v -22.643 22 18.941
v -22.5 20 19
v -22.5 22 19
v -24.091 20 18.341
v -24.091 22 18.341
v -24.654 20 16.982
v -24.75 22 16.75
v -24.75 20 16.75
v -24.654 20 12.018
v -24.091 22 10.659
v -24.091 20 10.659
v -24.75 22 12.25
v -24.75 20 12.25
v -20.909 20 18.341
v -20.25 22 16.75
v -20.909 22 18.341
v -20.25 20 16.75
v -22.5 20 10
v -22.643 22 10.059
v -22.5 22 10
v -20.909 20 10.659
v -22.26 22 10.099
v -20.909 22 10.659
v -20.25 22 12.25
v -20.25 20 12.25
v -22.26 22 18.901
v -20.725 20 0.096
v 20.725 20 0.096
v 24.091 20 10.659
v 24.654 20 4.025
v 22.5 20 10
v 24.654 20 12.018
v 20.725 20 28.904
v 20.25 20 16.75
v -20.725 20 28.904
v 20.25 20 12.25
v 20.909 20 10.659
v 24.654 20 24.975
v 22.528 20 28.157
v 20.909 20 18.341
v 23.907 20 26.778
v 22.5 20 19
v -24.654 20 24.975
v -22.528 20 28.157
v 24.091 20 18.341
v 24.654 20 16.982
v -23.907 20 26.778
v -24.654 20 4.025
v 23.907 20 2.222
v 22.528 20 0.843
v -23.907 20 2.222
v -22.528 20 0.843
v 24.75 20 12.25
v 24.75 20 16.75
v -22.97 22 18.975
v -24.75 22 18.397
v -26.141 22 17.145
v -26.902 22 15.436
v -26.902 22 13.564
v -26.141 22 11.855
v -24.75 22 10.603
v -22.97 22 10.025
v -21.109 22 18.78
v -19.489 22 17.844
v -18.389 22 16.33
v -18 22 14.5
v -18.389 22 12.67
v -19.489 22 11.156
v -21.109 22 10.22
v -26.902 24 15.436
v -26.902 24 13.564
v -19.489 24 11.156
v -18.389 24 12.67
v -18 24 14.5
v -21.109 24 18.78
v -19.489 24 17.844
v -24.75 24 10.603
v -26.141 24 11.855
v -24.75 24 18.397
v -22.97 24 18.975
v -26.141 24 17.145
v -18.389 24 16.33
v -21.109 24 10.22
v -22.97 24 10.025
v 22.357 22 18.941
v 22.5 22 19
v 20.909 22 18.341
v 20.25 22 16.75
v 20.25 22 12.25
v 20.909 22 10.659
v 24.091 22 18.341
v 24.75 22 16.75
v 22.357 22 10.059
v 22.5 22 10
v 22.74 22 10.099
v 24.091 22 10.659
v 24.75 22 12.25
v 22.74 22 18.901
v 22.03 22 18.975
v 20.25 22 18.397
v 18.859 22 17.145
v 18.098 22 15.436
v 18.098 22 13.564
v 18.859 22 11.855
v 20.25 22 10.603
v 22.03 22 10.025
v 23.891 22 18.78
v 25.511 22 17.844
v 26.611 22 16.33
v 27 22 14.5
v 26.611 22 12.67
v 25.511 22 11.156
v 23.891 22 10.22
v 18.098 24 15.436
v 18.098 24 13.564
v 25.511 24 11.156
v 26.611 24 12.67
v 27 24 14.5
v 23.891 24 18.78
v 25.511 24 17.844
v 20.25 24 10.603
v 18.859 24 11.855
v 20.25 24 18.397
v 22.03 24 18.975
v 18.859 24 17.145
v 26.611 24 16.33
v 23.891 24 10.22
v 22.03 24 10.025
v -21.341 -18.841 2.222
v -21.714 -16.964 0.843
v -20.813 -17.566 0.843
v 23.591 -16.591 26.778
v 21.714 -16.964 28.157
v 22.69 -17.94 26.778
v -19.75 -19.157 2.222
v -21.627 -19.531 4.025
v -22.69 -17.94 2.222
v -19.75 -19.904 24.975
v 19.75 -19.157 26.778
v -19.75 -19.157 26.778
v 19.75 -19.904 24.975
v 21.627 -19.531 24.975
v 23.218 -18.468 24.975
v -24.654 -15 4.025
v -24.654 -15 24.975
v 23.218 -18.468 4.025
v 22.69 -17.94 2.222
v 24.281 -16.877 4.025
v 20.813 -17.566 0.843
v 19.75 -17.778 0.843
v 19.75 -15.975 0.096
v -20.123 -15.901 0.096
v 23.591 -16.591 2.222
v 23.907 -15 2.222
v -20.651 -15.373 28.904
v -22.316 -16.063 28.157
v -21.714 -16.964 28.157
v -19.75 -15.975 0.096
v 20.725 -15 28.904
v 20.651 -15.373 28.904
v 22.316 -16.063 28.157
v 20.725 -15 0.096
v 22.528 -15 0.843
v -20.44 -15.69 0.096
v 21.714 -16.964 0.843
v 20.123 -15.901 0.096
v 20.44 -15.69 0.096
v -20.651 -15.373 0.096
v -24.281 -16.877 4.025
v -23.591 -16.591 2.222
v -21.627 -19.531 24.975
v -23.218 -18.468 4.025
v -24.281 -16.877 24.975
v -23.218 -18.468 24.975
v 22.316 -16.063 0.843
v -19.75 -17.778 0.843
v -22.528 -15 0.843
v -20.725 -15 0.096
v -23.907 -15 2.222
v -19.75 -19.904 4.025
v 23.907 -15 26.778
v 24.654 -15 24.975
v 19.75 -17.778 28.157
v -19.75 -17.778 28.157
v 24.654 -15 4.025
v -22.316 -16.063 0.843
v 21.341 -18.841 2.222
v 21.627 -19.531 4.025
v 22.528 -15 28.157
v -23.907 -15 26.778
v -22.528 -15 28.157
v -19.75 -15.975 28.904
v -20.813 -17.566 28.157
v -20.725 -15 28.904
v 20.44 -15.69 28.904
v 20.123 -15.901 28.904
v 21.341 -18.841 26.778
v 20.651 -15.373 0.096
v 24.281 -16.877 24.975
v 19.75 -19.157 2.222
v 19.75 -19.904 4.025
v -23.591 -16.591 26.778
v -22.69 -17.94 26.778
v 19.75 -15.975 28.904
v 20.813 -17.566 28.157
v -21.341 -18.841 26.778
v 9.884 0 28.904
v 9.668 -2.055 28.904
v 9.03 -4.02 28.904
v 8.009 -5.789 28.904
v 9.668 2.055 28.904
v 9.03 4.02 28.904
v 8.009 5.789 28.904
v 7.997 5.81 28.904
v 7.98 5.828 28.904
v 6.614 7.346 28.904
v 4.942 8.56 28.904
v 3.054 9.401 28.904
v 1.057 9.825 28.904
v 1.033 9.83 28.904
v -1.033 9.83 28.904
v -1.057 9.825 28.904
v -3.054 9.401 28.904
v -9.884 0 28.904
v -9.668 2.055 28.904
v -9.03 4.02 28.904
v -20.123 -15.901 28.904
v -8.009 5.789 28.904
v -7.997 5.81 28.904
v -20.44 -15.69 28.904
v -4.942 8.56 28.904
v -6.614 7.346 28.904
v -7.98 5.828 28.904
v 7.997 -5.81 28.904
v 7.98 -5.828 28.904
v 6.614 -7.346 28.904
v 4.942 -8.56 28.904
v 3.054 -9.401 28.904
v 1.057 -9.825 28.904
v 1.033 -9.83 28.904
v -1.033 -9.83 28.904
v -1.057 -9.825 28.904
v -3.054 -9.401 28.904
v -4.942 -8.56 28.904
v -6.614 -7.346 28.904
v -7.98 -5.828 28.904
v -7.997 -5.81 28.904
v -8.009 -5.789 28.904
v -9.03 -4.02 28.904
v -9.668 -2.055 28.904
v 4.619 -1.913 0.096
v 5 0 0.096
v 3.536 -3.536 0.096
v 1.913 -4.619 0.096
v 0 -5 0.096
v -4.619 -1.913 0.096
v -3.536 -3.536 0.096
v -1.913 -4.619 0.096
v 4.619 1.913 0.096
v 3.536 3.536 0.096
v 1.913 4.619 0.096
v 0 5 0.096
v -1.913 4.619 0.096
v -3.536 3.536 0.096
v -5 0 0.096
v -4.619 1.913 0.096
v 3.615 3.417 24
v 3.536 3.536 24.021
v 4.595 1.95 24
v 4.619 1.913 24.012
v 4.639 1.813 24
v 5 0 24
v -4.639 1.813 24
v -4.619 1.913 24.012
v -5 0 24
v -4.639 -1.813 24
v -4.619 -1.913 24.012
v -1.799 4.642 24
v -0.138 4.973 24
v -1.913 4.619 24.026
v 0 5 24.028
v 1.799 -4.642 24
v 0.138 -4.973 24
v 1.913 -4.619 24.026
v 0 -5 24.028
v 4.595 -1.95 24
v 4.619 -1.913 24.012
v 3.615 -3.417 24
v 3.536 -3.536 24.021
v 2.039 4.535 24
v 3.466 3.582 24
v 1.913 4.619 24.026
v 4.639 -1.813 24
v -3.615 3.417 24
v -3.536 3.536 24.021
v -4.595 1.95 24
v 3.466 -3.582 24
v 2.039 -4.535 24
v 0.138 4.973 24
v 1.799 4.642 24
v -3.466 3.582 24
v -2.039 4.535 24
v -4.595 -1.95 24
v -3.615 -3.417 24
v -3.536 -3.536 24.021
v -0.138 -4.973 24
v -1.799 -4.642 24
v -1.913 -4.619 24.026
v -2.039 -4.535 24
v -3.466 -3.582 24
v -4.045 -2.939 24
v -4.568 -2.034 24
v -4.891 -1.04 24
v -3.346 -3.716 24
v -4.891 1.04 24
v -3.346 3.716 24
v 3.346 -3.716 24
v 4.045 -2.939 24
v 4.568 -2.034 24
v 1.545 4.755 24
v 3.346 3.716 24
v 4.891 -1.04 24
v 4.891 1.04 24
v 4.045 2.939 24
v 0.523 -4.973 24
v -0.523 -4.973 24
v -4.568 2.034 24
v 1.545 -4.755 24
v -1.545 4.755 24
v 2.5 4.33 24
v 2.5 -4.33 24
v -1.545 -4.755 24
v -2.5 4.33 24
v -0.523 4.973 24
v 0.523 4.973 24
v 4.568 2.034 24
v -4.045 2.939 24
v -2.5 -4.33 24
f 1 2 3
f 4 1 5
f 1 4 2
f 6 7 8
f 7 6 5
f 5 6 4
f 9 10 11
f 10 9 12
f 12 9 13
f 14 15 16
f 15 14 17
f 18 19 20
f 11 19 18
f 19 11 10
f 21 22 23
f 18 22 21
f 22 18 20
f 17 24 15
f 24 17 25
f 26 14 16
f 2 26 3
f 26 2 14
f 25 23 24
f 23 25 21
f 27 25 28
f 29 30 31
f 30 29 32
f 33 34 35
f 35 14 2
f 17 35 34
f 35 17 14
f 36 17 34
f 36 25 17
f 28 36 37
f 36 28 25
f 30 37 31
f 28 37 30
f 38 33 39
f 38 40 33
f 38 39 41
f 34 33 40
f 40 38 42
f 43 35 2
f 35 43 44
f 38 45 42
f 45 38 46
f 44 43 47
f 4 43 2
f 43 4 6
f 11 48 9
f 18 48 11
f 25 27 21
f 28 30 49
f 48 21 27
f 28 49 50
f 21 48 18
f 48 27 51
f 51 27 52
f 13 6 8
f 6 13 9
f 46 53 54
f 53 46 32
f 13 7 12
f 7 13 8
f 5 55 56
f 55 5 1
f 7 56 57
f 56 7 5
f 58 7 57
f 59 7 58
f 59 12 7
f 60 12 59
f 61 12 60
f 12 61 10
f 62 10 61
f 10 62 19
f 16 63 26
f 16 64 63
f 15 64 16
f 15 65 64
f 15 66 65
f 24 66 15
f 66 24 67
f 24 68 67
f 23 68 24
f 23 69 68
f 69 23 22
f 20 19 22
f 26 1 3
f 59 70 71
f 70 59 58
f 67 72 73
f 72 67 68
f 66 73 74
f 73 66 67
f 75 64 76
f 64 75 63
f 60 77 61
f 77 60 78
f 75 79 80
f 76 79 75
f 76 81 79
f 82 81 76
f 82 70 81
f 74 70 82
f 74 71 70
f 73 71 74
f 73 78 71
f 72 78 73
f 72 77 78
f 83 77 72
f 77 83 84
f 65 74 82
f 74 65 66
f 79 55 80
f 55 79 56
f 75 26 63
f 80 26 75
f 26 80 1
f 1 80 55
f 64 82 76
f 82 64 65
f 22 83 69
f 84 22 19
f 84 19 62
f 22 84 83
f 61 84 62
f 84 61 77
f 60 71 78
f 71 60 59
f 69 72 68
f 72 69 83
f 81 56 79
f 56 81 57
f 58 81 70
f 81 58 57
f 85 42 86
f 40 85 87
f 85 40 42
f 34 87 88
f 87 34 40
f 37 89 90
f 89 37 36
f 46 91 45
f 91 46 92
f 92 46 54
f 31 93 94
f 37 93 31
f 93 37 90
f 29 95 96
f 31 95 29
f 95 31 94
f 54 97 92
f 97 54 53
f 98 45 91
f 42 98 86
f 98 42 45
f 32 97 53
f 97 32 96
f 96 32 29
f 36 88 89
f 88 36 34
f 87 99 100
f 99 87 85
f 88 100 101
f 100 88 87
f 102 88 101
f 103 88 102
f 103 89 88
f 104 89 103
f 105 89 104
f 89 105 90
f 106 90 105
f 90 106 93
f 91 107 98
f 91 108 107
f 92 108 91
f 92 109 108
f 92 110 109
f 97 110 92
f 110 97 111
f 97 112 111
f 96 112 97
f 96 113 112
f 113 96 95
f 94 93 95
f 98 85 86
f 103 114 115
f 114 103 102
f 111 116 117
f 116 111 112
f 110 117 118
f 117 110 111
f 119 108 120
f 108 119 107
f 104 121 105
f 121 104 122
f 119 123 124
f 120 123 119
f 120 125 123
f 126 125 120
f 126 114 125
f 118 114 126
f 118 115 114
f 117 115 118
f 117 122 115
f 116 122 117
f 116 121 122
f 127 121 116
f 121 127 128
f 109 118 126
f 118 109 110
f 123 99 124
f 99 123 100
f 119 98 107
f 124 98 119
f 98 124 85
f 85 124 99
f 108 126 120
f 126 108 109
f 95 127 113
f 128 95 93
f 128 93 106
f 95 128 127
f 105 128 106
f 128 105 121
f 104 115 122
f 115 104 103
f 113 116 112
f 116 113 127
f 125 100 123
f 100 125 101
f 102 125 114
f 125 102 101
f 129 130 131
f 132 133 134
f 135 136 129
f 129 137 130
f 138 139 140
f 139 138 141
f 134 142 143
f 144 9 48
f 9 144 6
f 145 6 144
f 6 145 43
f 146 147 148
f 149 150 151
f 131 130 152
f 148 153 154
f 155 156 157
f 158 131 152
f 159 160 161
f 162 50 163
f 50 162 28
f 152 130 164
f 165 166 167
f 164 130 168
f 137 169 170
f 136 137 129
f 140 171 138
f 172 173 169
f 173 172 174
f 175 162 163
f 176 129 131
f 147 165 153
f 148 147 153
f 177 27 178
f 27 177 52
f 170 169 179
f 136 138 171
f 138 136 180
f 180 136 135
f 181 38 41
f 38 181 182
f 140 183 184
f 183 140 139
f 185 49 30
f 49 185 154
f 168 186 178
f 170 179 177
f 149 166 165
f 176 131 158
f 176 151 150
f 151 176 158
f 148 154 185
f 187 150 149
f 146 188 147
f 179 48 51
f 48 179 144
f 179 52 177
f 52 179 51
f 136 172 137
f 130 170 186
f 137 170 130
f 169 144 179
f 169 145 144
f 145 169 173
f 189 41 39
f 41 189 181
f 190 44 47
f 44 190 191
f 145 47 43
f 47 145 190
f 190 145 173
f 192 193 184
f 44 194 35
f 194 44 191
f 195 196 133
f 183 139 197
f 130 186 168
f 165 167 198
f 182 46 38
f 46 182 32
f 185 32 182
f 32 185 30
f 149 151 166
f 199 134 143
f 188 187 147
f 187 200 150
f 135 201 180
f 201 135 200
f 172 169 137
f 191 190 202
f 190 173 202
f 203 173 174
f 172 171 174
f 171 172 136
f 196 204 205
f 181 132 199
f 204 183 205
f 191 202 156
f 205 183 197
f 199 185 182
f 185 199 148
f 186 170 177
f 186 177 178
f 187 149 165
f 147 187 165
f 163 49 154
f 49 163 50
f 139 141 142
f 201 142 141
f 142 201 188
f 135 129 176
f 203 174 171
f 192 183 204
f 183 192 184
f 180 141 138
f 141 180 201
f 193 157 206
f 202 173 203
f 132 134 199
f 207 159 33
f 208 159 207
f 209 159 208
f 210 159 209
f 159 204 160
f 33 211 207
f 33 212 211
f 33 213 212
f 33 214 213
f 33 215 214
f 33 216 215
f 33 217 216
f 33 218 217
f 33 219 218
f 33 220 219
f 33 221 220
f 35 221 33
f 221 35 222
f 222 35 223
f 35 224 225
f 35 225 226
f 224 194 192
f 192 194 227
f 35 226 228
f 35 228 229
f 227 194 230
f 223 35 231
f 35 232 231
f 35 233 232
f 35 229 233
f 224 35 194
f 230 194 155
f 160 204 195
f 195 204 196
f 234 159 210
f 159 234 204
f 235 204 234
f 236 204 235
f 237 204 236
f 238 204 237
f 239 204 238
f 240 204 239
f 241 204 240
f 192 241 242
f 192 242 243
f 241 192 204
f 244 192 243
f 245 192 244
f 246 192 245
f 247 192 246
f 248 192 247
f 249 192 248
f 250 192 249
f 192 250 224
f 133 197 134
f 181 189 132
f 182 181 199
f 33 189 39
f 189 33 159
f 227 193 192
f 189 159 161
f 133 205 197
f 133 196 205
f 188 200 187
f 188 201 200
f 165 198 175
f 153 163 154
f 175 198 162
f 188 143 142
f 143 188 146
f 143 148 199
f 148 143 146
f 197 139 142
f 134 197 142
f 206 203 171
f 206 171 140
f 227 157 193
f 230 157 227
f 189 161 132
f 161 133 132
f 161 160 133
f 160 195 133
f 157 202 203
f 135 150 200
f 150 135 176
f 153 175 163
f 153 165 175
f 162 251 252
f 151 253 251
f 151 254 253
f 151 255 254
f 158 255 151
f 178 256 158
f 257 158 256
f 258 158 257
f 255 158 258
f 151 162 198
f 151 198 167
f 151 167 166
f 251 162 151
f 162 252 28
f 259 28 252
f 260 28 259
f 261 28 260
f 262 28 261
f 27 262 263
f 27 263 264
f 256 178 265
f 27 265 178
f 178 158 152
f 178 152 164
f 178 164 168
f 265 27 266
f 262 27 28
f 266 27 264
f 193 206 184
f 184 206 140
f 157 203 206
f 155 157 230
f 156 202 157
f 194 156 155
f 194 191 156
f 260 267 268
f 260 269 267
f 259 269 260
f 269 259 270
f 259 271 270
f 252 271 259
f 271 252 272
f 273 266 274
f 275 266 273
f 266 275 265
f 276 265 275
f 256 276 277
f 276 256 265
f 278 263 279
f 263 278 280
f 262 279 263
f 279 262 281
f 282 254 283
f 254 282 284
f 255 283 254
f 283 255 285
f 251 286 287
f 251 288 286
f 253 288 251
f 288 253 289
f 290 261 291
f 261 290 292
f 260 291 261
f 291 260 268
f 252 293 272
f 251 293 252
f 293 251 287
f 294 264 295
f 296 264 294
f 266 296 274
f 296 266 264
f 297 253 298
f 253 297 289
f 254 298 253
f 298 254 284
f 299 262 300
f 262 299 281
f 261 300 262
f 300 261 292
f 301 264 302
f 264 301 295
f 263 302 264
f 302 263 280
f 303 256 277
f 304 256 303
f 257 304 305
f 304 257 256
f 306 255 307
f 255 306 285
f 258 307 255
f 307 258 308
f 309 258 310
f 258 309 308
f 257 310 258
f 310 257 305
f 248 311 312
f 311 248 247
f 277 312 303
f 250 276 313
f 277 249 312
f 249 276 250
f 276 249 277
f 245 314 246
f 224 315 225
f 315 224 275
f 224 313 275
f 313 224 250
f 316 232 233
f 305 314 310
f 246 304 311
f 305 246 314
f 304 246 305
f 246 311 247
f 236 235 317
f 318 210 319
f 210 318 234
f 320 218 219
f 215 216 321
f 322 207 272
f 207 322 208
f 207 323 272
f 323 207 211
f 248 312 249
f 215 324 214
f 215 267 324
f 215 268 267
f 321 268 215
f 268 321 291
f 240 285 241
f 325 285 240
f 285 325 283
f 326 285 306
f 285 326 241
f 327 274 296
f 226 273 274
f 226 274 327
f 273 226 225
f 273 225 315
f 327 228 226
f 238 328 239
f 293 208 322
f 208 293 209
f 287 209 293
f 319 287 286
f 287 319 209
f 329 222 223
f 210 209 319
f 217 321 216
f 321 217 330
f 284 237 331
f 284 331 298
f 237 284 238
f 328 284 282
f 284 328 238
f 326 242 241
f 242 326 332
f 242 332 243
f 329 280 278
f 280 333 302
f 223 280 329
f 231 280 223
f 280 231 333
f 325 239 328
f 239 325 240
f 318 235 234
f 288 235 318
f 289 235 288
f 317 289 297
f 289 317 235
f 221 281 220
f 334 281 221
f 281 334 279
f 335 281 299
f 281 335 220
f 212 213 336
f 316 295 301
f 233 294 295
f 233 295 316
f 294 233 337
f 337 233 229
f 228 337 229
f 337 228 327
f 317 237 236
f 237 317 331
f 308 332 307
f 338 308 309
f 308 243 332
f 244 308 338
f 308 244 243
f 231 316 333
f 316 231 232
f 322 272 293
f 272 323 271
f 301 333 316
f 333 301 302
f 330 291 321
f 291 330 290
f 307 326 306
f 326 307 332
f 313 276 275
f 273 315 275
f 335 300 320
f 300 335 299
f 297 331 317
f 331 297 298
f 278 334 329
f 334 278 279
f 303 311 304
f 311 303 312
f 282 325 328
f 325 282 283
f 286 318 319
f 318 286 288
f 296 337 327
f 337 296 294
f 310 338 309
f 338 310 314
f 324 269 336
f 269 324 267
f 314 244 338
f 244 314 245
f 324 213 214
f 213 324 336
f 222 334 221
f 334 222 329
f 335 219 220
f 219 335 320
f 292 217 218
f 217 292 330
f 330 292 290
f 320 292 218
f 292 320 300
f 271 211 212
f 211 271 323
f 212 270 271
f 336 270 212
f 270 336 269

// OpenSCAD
// file: peg.scad
pegSlot = 5; // the small opening it slides into
pegD = 9;    // the large opening to put it into
pegH = 22;   // top of large opening to bottom of small opening

holeD = 3.75; // "screw" holes

holeSpacingX = 15;
holeSpacingY = 14.5; // yes, this is actually not a grid. go figure
pegSpacingX = 3 * holeSpacingX;
pegSpacingY = 4 * holeSpacingY;

module peg(t = 2, clearance = 2)
{
    D = pegD;
    d = 4.5;

    rotate([ -90, 0, 0 ])
    {
        hull()
        {
            translate([ 0, (D - d) / 2, 0 ]) cylinder(h = clearance, d = d);
            translate([ 0, -(D - d) / 2, 0 ]) cylinder(h = clearance, d = d);
        }
        translate([ 0, 0, clearance ]) cylinder(h = t, d = D);
    }
}

module pegs(n, t = 2, clearance = 2)
{
    pegSpacingX = 45;
    x0 = ((1 - n) * pegSpacingX) / 2;
    for (i = [0:(n - 1)])
    {
        translate([ x0 + i * pegSpacingX, 0, 0 ]) peg(t, clearance);
    }
}
// main file
include<peg.scad>;

wera7400();
module wera7400(t = 4, rounding = 5)
{
    d = 10; // loosly fit 1/4" bit extender

    H = 25 + t;
    W = 40;
    L = 49.5;
    translate([ 0, W / 2, H / 2 ]) pegs(2);
    difference()
    {
        minkowski()
        {
            l = L - 2 * rounding;
            w = W - rounding;
            translate([ -l / 2, rounding / 2 - w / 2, rounding ]) cube([ l, w, H - 2 * rounding ]);
            difference()
            {
                sphere(r = rounding);
                translate([ -rounding - .01, 0, -rounding - .01 ]) cube(2 * rounding + .02);
            }
        }
        translate([ 0, 0, -.01 ]) cylinder(h = H + .02, d = d);
        translate([ 0, 0, H - rounding ]) cylinder(h = rounding + .02, d1 = d, d2 = d + 2 * rounding);
    }
}
